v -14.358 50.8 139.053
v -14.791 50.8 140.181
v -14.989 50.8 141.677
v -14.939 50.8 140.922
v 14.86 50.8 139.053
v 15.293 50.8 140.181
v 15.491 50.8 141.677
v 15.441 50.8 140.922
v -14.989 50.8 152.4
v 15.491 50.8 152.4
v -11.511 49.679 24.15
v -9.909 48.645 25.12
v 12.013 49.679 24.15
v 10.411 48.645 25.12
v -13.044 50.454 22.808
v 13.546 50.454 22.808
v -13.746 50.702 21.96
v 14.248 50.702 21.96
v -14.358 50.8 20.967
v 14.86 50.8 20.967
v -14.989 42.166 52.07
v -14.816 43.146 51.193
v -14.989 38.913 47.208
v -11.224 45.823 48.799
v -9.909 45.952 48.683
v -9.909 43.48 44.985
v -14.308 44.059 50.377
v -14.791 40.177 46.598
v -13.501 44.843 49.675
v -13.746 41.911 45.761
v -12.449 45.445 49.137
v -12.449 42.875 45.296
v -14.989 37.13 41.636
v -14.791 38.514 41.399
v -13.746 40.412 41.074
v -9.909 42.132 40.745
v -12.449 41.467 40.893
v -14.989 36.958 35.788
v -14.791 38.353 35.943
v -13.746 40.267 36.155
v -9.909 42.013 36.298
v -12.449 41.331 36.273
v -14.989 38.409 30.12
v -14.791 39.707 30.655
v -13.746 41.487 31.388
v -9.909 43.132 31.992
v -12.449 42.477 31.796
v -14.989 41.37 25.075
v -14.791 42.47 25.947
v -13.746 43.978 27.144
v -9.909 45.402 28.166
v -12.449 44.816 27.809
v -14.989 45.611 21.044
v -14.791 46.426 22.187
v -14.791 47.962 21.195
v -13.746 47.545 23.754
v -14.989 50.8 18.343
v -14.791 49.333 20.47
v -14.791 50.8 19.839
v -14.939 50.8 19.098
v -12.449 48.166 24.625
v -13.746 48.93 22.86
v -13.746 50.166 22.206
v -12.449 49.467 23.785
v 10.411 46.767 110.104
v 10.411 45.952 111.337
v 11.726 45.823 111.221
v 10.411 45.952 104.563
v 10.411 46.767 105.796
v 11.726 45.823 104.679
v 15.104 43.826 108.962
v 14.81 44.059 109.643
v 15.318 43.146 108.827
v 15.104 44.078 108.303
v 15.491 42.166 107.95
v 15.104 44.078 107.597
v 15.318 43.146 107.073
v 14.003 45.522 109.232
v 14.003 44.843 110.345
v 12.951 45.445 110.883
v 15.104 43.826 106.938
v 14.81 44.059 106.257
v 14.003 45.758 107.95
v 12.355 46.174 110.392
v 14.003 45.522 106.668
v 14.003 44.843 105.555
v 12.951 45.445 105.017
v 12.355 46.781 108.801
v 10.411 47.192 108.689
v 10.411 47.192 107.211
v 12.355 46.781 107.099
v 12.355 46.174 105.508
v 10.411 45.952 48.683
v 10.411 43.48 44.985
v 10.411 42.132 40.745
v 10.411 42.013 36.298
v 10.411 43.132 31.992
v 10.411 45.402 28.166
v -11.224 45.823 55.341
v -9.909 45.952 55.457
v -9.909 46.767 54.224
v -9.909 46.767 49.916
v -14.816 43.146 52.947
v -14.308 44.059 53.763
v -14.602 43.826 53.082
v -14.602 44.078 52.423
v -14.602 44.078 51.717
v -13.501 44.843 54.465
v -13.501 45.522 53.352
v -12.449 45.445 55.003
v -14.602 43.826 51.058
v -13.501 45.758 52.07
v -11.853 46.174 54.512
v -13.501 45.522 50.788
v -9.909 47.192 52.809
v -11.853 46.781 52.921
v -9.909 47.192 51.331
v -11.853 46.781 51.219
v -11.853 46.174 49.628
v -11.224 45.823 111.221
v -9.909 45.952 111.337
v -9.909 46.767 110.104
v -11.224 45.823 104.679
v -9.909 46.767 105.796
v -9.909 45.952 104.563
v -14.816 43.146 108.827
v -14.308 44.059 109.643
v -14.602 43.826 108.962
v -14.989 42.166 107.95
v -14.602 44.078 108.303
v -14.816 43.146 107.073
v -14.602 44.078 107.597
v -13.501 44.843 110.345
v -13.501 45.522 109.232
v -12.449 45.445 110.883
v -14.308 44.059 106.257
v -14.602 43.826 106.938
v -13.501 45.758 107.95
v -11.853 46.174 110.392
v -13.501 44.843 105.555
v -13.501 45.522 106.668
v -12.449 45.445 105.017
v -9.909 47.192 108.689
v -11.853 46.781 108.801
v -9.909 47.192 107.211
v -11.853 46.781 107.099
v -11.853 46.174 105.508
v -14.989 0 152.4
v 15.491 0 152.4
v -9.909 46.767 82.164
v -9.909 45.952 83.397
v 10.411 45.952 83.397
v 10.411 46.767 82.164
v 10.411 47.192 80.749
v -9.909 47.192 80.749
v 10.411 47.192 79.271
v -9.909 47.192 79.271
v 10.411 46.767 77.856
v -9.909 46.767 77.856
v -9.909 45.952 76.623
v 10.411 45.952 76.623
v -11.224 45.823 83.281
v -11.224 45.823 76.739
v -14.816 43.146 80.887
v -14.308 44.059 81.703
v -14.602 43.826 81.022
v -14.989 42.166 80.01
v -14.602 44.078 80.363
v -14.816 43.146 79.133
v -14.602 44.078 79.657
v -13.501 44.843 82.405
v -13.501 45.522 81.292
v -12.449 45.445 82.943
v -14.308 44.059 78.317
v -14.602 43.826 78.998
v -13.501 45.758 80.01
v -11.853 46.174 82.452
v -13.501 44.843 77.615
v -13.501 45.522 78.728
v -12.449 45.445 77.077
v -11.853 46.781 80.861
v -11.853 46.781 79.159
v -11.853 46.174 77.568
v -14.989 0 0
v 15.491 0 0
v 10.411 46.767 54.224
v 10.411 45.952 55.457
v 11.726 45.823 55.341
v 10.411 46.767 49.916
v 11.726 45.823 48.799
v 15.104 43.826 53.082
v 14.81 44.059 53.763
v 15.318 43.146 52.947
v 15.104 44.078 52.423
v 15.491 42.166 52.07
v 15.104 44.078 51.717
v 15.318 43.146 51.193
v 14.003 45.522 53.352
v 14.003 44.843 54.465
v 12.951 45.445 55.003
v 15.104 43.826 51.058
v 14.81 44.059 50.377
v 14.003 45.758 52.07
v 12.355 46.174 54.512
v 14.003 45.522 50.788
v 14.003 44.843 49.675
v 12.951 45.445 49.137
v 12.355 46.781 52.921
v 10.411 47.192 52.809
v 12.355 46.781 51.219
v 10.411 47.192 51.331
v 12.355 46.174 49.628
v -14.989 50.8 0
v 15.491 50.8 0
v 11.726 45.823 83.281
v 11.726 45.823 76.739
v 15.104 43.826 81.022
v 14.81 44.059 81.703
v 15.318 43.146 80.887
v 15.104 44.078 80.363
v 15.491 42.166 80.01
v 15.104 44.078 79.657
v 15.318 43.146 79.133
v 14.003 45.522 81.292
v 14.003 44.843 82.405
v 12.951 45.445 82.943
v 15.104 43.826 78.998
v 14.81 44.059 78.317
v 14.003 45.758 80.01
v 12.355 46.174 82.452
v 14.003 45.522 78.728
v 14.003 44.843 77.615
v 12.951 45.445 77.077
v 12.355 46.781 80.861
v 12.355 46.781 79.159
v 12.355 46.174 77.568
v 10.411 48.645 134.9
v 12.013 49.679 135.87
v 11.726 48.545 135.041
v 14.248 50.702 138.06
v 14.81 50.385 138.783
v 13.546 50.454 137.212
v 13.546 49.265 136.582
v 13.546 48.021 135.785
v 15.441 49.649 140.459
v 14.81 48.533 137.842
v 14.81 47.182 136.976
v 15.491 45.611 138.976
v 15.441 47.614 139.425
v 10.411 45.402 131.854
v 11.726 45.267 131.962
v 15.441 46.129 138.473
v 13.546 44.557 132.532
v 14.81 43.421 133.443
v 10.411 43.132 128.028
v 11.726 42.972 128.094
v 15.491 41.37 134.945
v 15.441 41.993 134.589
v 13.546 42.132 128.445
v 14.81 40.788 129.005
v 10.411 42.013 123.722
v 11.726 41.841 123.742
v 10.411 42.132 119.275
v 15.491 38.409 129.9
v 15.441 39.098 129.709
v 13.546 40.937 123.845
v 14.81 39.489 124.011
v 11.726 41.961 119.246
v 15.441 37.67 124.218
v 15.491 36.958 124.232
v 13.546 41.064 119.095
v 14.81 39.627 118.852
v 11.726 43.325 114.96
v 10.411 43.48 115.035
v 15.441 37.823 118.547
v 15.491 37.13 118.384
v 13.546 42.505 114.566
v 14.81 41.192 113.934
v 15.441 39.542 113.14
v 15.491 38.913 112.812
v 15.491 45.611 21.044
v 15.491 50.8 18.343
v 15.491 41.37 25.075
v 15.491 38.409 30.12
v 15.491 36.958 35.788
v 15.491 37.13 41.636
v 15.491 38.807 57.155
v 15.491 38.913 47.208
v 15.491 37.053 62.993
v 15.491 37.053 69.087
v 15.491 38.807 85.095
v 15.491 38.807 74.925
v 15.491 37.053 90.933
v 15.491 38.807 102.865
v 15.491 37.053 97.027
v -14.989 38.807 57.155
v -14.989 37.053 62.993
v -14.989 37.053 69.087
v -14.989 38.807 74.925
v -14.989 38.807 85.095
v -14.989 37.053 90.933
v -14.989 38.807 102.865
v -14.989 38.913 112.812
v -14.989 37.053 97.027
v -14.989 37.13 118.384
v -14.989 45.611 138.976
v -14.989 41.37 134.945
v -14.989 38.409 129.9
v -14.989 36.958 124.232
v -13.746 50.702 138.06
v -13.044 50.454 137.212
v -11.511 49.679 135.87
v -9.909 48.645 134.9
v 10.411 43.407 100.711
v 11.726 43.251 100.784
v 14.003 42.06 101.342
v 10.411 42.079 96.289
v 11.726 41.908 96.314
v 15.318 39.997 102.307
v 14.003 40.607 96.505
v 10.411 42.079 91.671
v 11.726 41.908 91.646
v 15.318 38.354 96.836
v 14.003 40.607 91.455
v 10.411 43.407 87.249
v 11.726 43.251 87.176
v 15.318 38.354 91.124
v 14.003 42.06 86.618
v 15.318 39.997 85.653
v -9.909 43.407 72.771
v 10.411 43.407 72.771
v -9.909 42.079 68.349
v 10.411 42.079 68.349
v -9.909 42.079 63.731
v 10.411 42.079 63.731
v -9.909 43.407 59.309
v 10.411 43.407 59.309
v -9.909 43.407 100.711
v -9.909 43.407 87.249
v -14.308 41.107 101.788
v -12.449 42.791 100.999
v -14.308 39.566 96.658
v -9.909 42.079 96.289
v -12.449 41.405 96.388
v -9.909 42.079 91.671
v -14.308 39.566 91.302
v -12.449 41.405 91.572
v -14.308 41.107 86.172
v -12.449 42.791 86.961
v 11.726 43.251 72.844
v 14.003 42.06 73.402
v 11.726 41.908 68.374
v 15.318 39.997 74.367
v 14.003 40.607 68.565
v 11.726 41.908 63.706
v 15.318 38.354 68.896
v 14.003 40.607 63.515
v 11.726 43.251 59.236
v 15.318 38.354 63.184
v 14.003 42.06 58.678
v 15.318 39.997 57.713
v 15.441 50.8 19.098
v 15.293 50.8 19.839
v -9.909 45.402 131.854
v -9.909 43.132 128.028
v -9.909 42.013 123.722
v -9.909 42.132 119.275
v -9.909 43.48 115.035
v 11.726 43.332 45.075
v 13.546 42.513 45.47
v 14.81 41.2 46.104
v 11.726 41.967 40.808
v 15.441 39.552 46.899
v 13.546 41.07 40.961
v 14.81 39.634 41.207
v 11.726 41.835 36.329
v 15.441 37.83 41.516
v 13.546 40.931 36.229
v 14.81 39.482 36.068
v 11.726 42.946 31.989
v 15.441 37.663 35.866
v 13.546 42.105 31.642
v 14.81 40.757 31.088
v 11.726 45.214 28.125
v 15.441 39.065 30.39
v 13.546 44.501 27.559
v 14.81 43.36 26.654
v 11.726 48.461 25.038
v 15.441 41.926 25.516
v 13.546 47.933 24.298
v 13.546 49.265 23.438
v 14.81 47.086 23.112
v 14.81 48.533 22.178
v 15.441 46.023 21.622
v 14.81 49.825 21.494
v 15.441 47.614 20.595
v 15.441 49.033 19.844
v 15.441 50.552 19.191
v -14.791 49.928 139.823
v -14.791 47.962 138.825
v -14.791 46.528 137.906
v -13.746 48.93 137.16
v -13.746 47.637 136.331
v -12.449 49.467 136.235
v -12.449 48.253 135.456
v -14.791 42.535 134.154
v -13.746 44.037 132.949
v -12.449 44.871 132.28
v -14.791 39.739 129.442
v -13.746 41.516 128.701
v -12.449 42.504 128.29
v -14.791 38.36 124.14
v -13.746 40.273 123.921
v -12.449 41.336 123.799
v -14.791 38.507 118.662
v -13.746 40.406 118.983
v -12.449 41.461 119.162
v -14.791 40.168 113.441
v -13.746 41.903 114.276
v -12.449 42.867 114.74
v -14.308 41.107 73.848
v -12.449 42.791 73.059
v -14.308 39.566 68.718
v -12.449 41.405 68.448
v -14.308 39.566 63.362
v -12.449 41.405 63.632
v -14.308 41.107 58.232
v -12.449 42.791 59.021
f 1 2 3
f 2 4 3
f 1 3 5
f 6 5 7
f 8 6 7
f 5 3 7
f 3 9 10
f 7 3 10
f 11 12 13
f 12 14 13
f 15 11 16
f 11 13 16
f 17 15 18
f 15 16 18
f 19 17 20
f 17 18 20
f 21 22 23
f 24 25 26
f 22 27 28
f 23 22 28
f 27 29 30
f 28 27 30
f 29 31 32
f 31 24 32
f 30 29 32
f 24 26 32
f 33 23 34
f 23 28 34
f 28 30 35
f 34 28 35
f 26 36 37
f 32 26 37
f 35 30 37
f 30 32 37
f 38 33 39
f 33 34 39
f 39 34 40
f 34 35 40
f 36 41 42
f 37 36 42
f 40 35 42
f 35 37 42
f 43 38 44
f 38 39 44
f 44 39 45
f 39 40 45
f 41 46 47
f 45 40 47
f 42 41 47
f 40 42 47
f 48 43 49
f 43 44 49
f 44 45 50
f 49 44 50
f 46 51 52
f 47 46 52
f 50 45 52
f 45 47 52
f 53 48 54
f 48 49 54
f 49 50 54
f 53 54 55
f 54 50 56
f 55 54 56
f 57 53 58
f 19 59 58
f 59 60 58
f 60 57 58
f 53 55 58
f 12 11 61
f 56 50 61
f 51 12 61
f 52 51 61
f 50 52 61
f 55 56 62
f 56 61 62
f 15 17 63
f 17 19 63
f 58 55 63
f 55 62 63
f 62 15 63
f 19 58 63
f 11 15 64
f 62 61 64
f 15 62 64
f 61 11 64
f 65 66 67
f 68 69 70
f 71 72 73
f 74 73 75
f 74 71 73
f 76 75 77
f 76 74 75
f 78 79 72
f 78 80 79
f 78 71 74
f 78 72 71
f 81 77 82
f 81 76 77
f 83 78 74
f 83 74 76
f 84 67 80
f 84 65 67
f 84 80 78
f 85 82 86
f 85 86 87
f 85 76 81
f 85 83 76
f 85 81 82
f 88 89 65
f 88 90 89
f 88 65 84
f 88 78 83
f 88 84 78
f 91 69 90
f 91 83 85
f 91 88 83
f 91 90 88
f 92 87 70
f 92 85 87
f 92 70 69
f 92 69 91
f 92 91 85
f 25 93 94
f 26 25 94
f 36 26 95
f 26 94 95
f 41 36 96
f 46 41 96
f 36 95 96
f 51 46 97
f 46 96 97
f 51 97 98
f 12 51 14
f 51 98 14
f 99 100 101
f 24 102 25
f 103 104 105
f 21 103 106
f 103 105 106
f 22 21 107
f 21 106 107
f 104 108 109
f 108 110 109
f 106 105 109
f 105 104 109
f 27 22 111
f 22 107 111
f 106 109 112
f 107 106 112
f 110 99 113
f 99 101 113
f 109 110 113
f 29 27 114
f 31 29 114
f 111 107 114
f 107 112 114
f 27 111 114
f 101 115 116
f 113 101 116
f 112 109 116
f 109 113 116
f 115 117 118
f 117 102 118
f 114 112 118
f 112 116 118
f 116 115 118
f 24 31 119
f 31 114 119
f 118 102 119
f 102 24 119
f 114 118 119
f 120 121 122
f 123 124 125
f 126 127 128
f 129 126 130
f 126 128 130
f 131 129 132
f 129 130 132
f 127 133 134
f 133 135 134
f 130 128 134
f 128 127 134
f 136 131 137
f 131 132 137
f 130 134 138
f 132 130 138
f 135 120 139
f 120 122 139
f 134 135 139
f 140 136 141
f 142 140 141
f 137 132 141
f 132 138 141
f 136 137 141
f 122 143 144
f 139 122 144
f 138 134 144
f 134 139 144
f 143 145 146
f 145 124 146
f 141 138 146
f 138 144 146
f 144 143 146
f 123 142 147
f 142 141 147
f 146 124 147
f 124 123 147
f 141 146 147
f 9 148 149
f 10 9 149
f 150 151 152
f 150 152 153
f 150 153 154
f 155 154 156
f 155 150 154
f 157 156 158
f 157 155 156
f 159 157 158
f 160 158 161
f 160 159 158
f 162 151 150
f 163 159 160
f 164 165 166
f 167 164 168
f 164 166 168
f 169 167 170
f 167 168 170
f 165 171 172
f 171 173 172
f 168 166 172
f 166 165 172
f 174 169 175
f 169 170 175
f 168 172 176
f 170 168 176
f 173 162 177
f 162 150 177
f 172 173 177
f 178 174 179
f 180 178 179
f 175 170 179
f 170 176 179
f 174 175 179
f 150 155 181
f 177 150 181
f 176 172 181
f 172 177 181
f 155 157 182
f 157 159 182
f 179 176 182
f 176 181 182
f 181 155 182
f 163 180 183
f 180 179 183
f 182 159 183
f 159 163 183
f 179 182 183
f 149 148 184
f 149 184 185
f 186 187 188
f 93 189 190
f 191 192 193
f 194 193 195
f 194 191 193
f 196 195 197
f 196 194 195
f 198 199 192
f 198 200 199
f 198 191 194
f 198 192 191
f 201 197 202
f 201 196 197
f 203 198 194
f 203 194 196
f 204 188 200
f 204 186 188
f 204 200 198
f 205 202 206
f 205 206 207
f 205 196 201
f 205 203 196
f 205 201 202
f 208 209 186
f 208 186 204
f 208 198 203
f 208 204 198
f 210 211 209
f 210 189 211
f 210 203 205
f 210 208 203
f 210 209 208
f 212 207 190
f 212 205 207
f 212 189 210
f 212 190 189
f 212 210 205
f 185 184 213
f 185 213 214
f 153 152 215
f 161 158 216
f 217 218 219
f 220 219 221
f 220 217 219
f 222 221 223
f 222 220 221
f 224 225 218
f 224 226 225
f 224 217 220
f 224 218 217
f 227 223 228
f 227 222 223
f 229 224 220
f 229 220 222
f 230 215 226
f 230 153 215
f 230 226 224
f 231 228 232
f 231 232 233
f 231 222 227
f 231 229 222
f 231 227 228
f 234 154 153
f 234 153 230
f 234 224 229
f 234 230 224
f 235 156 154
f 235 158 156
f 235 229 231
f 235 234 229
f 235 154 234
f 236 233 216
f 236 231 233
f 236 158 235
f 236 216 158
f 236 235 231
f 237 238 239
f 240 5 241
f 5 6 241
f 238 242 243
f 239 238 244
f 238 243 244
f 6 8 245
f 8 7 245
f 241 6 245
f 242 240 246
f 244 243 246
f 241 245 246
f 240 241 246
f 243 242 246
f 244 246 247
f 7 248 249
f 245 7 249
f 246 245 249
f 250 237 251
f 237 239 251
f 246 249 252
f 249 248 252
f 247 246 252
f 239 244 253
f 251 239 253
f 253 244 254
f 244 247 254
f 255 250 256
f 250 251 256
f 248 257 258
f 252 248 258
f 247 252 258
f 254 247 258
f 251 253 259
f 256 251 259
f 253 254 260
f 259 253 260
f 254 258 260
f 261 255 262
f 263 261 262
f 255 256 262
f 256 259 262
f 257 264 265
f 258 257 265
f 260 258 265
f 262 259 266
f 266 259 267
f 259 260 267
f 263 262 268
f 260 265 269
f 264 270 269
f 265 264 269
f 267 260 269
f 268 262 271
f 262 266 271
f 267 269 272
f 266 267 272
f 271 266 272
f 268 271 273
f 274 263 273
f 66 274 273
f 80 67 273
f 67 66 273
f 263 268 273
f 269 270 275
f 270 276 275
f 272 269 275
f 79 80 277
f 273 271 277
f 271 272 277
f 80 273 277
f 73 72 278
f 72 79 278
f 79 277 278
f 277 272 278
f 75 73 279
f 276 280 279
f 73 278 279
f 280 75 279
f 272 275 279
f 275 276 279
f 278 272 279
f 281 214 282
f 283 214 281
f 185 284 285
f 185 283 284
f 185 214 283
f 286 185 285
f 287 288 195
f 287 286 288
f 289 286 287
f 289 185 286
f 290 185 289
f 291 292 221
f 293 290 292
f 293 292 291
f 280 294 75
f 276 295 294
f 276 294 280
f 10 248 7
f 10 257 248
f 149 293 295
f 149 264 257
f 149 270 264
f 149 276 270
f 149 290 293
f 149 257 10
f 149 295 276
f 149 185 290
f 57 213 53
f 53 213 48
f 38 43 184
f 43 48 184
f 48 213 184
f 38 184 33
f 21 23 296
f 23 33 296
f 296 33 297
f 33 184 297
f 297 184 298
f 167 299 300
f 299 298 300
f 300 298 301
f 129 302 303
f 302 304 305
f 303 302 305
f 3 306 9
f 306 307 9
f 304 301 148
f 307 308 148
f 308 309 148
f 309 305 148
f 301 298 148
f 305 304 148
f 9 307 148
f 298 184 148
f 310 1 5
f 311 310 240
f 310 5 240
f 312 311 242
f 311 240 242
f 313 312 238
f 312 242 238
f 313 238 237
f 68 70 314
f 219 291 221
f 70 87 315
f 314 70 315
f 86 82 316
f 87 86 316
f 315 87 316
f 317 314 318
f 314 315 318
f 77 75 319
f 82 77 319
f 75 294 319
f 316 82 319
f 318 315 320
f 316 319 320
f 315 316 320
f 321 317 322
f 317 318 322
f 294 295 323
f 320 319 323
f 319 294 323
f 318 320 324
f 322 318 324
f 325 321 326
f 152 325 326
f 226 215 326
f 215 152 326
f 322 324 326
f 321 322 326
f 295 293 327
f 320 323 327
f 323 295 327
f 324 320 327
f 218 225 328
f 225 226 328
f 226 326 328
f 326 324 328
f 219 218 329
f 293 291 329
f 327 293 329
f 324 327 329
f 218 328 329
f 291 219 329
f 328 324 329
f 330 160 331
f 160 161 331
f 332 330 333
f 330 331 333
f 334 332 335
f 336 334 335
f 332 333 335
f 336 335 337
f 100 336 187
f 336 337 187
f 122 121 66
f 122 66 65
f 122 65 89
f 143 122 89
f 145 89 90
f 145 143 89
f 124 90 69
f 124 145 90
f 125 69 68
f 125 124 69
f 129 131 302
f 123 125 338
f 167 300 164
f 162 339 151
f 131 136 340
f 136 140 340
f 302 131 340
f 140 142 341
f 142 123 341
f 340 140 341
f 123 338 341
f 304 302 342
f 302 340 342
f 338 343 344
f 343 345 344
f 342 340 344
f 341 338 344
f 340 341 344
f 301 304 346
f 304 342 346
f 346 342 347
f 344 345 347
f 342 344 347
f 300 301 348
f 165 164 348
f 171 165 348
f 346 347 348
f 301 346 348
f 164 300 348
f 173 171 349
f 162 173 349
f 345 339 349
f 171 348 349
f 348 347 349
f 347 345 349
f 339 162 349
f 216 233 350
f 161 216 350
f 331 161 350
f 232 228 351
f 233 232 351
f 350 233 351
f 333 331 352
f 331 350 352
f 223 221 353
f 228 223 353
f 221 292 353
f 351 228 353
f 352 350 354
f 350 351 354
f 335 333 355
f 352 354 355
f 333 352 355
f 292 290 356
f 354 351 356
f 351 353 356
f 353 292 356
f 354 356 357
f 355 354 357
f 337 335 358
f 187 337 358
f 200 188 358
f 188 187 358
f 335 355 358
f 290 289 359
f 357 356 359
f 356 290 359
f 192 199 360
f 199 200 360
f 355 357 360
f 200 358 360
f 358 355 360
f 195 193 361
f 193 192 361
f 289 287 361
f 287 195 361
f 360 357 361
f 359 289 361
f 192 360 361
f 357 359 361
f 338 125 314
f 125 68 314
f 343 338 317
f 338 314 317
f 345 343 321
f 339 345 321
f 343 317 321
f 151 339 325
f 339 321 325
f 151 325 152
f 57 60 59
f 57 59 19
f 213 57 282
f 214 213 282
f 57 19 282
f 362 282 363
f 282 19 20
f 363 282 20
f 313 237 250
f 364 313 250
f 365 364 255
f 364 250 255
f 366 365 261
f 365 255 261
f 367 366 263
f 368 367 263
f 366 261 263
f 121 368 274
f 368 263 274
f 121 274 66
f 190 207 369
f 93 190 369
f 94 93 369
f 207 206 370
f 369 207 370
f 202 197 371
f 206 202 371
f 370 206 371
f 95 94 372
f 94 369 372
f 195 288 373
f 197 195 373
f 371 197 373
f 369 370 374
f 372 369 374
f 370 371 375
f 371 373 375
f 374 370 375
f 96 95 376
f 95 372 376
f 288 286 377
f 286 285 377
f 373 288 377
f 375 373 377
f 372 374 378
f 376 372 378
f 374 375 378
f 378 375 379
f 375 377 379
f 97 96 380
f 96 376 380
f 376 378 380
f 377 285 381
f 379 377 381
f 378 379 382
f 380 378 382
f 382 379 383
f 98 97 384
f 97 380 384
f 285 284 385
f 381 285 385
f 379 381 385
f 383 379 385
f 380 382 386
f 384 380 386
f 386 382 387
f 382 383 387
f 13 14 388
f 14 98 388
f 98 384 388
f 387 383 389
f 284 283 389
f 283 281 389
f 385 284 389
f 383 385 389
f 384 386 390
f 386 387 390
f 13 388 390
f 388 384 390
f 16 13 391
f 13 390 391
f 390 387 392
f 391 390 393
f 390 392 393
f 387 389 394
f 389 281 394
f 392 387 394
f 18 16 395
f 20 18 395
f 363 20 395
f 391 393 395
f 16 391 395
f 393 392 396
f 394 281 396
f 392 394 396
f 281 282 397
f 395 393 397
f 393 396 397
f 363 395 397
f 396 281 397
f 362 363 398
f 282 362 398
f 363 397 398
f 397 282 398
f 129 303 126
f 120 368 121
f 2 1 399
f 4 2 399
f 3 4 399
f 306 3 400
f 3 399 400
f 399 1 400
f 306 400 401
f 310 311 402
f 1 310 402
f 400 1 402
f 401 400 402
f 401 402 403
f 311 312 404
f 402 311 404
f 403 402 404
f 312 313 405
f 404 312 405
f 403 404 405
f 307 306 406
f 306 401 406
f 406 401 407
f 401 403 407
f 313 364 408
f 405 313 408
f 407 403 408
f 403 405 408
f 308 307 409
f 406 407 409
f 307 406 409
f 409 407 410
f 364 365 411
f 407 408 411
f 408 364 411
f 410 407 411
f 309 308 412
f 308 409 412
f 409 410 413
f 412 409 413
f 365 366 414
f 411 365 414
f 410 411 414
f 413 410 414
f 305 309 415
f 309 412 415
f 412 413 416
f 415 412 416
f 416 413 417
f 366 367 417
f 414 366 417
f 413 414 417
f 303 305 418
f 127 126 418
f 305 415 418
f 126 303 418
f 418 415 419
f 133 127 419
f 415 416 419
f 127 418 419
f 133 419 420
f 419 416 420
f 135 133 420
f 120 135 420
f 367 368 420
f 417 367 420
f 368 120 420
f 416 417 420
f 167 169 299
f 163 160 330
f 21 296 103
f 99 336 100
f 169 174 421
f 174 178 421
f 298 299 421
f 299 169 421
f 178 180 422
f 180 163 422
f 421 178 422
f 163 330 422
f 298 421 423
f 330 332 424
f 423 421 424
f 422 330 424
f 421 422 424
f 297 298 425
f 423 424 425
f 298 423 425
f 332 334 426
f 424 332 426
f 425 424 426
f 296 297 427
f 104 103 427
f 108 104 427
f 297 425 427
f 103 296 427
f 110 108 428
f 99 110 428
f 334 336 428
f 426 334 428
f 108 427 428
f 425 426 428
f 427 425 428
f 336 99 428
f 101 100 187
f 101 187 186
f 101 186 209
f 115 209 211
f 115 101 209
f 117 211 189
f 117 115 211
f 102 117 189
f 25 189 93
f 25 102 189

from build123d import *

# Parameters (mm, degrees)
F0_W     = 30.48
F0_H     = 152.4
F1_DEPTH = 50.8
F3_DEPTH = 30.481
F4_R     = 5.08


with BuildPart() as f1:
    # F0 (on Front) → F1 (new body)
    with BuildSketch(Plane.XZ):
        with Locations((0.2509840885, 76.2)):
            Rectangle(F0_W, F0_H)
    extrude(amount=-F1_DEPTH)

    # F2 (on face) → F3 (cut, through all)
    with BuildSketch(Plane.YZ.offset(15.4909840885)):
        with BuildLine():
            ThreePointArc((65.3252072253, 107.95), (71.4179823352, 113.7862789789), (73.66, 121.92))
            ThreePointArc((73.66, 121.92), (49.6512789789, 135.5529823352), (50.2447927747, 107.95))
            ThreePointArc((50.2447927747, 107.95), (57.785, 109.855), (65.3252072253, 107.95))
        make_face()
        with BuildLine():
            ThreePointArc((65.3252072253, 107.95), (57.785, 109.855), (50.2447927747, 107.95))
            ThreePointArc((50.2447927747, 107.95), (57.785, 106.045), (65.3252072253, 107.95))
        make_face()
        with BuildLine():
            ThreePointArc((65.3252072253, 107.95), (57.785, 106.045), (50.2447927747, 107.95))
            ThreePointArc((50.2447927747, 107.95), (41.91, 93.98), (50.2447927747, 80.01))
            ThreePointArc((50.2447927747, 80.01), (57.785, 81.915), (65.3252072253, 80.01))
            ThreePointArc((65.3252072253, 80.01), (71.4179823352, 85.8462789789), (73.66, 93.98))
            ThreePointArc((73.66, 93.98), (71.4179823352, 102.1137210211), (65.3252072253, 107.95))
        make_face()
        with BuildLine():
            ThreePointArc((65.3252072253, 80.01), (57.785, 81.915), (50.2447927747, 80.01))
            ThreePointArc((50.2447927747, 80.01), (57.785, 78.105), (65.3252072253, 80.01))
        make_face()
        with BuildLine():
            ThreePointArc((65.3252072253, 80.01), (57.785, 78.105), (50.2447927747, 80.01))
            ThreePointArc((50.2447927747, 80.01), (41.91, 66.04), (50.2447927747, 52.07))
            ThreePointArc((50.2447927747, 52.07), (57.785, 53.975), (65.3252072253, 52.07))
            ThreePointArc((65.3252072253, 52.07), (71.4179823352, 57.9062789789), (73.66, 66.04))
            ThreePointArc((73.66, 66.04), (71.4179823352, 74.1737210211), (65.3252072253, 80.01))
        make_face()
        with BuildLine():
            ThreePointArc((65.3252072253, 52.07), (57.785, 53.975), (50.2447927747, 52.07))
            ThreePointArc((50.2447927747, 52.07), (57.785, 50.165), (65.3252072253, 52.07))
        make_face()
        with BuildLine():
            ThreePointArc((65.3252072253, 52.07), (57.785, 50.165), (50.2447927747, 52.07))
            ThreePointArc((50.2447927747, 52.07), (49.6512789789, 24.4670176648), (73.66, 38.1))
            ThreePointArc((73.66, 38.1), (71.4179823352, 46.2337210211), (65.3252072253, 52.07))
        make_face()
    extrude(amount=-F3_DEPTH, mode=Mode.SUBTRACT)

    # F4
    f4_edges = [f1.edges().sort_by_distance(p)[0] for p in [
        (15.490984, 41.91307, 122.232205),
        (15.490984, 41.91307, 37.787795),
        (-14.989016, 41.91307, 122.232205),
        (-14.989016, 41.91, 93.98),
        (-14.989016, 41.91, 66.04),
        (-14.989016, 41.91307, 37.787795),
        (0.250984, 50.8, 23.844285),
        (0.250984, 50.8, 136.175715),
        (0.250984, 50.244793, 52.07),
        (15.490984, 41.91, 66.04),
        (0.250984, 50.244793, 80.01),
        (15.490984, 41.91, 93.98),
        (0.250984, 50.244793, 107.95),
    ]]
    fillet(f4_edges, radius=F4_R)


solid = f1.part
